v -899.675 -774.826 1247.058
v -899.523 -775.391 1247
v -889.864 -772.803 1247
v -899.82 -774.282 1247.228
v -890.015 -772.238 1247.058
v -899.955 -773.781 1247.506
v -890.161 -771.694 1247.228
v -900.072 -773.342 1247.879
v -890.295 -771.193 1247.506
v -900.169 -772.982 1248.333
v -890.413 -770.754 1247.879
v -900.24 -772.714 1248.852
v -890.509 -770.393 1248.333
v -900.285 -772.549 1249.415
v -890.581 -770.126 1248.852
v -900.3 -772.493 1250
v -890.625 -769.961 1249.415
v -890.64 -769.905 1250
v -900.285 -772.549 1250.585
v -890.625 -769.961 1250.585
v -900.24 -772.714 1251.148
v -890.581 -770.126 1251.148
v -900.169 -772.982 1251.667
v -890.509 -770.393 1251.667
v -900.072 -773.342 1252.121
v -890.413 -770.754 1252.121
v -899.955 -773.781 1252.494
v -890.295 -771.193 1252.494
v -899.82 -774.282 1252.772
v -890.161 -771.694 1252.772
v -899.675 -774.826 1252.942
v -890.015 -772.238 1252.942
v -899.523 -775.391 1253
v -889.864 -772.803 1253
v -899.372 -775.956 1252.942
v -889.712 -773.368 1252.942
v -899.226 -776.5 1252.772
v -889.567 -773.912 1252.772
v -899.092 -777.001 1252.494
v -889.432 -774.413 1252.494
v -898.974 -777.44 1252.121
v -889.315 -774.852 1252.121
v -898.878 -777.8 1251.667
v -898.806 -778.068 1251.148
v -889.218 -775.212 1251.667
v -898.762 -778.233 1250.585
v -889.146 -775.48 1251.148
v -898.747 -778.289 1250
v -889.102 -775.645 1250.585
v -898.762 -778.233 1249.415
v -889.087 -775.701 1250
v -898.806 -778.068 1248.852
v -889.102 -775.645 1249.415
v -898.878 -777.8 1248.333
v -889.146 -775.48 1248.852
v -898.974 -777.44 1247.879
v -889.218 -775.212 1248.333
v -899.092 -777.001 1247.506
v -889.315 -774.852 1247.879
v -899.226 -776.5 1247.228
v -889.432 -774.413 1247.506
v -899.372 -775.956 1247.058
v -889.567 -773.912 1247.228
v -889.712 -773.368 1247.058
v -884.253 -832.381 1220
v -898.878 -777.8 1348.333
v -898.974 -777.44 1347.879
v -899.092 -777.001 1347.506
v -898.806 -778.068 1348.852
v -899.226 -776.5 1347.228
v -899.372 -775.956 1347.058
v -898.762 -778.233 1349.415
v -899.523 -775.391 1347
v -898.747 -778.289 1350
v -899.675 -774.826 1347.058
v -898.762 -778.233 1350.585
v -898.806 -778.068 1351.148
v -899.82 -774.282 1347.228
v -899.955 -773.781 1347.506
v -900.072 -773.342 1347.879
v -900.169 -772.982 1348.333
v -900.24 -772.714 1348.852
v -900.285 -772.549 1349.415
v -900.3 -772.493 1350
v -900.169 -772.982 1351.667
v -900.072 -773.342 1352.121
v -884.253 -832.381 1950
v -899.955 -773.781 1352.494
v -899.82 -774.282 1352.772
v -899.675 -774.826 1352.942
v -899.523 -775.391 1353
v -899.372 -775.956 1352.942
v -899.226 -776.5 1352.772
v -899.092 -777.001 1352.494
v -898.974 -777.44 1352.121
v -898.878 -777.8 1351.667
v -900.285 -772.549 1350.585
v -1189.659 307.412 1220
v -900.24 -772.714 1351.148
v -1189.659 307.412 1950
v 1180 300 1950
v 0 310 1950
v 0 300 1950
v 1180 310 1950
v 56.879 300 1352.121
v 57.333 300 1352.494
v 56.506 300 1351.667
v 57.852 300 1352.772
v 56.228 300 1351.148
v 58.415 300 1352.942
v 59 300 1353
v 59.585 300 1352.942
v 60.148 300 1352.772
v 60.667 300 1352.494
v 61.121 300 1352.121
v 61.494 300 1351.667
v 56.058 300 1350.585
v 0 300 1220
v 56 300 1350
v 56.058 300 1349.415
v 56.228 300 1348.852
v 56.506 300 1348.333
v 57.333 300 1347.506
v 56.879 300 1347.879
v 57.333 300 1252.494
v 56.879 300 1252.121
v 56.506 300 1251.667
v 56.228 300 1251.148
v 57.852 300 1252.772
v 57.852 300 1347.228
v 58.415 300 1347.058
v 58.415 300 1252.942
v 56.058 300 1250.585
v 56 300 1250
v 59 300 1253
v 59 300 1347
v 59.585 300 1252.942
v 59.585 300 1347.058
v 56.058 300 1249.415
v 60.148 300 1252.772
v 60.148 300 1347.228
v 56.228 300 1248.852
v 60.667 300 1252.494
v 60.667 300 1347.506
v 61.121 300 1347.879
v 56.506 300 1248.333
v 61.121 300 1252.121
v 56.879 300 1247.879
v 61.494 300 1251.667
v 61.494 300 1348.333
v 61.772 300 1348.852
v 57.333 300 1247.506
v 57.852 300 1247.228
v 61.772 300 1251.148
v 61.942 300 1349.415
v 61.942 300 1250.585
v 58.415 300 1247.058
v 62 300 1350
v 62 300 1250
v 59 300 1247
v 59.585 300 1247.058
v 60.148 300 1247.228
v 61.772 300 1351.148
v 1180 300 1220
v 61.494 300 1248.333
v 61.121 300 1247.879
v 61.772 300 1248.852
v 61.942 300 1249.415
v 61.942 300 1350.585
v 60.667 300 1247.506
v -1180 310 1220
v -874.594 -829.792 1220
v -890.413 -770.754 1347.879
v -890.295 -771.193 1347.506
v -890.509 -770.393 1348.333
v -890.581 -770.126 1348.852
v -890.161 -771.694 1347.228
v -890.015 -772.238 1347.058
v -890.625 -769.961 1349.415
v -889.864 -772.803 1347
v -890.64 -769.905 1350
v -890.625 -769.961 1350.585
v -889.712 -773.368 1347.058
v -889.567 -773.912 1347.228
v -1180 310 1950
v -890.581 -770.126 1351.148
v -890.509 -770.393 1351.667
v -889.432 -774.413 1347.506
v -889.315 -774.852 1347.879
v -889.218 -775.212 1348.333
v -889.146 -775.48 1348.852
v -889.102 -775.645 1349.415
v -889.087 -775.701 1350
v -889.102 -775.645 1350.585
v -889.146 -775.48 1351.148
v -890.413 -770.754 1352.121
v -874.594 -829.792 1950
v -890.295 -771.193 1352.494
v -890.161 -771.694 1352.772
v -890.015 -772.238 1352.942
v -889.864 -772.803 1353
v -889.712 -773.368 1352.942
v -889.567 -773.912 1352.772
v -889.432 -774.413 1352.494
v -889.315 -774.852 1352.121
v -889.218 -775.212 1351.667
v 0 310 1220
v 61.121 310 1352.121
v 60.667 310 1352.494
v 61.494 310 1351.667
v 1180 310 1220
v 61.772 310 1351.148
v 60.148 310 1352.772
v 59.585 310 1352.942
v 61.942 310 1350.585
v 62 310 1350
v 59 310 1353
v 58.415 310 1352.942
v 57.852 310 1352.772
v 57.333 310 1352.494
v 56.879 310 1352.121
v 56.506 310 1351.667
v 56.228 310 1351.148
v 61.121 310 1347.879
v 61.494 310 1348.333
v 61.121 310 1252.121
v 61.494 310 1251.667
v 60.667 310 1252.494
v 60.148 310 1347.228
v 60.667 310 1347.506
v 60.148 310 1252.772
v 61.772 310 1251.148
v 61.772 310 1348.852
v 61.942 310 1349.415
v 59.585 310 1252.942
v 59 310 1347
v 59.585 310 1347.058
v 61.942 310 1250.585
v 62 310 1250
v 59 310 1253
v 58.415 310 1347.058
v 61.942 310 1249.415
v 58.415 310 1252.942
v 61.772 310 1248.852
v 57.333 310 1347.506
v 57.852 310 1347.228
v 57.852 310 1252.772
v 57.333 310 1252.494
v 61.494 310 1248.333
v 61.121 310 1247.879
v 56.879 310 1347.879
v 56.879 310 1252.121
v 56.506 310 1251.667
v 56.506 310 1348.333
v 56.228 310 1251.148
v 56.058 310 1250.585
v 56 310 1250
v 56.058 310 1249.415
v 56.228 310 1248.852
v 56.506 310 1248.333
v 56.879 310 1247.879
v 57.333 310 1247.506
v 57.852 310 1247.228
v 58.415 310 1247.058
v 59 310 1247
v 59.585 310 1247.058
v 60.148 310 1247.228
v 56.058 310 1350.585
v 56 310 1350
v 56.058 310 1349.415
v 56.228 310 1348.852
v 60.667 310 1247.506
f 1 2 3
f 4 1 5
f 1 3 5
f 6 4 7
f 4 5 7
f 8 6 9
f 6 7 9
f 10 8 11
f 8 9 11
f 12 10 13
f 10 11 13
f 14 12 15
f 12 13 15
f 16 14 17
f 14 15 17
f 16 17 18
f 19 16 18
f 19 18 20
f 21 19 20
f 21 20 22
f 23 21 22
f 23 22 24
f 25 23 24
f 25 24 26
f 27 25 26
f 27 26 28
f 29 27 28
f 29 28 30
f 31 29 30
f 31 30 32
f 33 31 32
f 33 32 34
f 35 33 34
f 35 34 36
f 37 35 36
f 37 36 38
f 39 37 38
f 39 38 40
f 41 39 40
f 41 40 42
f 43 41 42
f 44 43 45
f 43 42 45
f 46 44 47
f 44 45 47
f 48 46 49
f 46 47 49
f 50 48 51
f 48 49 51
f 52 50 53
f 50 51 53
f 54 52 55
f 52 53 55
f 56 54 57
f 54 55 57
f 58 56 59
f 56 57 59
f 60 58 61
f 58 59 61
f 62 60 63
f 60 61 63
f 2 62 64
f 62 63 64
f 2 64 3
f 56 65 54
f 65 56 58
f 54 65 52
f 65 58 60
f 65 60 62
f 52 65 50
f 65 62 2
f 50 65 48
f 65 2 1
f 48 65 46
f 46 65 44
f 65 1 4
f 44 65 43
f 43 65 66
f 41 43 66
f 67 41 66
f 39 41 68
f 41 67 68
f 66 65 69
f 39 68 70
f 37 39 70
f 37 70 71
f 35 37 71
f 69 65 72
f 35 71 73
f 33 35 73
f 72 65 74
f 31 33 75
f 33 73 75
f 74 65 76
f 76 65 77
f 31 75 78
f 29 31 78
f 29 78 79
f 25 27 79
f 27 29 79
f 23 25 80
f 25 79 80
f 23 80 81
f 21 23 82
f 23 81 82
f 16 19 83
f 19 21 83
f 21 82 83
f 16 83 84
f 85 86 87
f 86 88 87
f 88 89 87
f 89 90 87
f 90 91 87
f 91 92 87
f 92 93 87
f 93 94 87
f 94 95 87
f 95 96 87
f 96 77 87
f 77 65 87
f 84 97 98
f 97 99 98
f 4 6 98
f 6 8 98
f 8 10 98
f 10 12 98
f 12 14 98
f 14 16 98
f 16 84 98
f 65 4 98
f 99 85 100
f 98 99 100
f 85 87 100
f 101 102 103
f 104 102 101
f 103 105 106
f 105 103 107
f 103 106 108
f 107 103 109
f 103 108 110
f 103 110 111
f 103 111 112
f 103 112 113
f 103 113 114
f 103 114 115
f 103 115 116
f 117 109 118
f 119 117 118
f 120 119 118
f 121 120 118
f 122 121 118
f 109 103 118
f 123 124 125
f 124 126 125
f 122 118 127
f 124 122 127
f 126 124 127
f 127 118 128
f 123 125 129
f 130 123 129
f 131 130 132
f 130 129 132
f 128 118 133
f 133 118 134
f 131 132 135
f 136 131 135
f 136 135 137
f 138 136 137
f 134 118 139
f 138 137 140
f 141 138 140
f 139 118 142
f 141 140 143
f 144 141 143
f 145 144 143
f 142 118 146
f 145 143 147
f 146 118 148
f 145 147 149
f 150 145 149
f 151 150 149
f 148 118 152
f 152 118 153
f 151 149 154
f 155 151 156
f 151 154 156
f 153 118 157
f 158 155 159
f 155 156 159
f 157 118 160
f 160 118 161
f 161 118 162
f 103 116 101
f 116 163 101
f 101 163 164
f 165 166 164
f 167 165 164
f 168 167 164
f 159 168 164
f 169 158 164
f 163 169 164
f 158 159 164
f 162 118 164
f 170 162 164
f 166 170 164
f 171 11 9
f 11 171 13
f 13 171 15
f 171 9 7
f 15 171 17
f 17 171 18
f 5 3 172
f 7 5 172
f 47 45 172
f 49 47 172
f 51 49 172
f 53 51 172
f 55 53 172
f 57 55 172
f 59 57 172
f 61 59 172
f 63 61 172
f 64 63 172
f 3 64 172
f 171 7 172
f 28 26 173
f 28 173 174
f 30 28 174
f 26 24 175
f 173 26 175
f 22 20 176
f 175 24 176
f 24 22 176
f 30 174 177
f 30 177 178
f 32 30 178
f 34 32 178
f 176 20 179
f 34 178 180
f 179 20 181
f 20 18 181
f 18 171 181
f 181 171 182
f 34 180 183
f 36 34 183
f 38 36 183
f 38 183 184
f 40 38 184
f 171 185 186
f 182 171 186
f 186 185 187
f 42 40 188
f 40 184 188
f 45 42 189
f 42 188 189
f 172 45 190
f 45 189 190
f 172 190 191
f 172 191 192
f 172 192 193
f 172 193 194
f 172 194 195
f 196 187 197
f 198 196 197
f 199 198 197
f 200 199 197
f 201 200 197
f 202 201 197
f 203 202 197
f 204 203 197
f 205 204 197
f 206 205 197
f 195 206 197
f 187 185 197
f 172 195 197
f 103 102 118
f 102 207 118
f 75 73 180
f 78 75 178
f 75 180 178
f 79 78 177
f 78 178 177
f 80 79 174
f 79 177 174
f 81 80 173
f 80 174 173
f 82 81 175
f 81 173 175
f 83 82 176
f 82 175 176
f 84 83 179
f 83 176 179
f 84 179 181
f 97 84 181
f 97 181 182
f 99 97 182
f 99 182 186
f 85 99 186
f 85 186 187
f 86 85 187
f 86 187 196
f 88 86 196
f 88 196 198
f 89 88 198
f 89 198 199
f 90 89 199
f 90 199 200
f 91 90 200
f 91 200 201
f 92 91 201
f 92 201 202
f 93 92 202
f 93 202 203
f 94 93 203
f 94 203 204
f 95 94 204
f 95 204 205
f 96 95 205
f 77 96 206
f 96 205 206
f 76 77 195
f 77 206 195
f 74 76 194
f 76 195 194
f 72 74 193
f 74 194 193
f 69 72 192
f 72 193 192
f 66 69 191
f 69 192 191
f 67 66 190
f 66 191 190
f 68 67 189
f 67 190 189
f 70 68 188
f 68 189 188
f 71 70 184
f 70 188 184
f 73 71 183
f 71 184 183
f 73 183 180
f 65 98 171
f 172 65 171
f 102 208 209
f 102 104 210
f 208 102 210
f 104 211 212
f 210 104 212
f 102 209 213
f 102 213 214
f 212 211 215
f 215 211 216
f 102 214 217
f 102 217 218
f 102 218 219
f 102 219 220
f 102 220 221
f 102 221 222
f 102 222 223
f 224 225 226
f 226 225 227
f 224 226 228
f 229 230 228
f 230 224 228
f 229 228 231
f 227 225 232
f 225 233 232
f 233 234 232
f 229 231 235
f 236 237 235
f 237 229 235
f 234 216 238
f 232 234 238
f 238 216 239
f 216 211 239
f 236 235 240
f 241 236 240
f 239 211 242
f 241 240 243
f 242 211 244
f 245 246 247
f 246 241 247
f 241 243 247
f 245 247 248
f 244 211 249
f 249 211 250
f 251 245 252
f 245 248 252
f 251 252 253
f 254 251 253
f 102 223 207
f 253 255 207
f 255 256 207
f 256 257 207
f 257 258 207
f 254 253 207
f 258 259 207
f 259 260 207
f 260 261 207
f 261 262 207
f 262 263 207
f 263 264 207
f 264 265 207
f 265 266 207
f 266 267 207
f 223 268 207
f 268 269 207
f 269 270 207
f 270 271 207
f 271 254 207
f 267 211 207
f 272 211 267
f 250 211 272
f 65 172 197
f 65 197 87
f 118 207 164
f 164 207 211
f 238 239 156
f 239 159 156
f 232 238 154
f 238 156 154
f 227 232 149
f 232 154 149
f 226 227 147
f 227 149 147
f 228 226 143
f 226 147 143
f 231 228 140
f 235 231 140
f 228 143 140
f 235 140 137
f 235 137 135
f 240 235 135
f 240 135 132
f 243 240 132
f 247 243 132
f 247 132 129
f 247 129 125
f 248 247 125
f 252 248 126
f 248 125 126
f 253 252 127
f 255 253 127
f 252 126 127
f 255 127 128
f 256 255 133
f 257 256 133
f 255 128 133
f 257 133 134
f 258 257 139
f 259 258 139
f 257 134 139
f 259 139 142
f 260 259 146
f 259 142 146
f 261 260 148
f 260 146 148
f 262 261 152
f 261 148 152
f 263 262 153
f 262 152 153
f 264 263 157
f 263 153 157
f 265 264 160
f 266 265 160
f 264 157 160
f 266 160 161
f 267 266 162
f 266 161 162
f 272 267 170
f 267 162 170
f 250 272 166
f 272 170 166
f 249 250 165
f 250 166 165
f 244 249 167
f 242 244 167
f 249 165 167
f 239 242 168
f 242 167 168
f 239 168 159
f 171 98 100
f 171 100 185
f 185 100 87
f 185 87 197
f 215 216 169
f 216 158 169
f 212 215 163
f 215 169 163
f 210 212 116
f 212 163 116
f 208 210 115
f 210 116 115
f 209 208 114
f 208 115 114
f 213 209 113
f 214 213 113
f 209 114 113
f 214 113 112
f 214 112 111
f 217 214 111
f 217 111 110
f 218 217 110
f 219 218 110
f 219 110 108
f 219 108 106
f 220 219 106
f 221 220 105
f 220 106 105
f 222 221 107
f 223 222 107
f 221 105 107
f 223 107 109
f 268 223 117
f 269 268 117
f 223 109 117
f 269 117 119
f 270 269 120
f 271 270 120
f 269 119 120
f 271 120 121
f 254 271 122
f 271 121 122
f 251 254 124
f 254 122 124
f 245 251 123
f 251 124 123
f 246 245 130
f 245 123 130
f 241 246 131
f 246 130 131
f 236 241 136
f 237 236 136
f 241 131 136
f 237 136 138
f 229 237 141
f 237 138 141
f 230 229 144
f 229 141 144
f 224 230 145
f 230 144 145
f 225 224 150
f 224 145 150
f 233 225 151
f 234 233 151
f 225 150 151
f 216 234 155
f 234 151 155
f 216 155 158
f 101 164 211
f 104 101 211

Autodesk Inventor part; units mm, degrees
ref_plane "YZ Plane" through (0, 0, 0) normal (1, 0, 0) x (0, 1, 0)
ref_plane "XZ Plane" through (0, 0, 0) normal (0, 1, 0) x (-1, 0, 0)
ref_plane "Plano de trabajo4" through (0, 0, 1220) normal (0, 0, 1) x (1, 0, 0)
sketch "Boceto8" plane through (0, 0, 1220) normal (0, 0, 1) x (1, 0, 0)
  line L0 (480, 0) -> (0, 0) projected
  line L1 (480, 0) -> (480, 10) projected
  line L2 (0, 10) -> (480, 10) projected
  line L3 (0, 0) -> (0, 10) projected
  line L4 (480, 10) -> (0, 10) projected
  line L5 (0, 10) -> (0, 300)
  line L6 (0, 300) -> (1180, 300)
  line L7 (1180, 300) -> (1180, 310)
  line L8 (1180, 310) -> (0, 310)
  line L9 (0, 310) -> (0, 300)
  point P0 (0, 0)
  dimension "d38" = 290
  dimension "d39" = 1180
  dimension "d40" = 10
extrude "Extrusión8" add sketch "Boceto8" along normal blind 730 contours L9 L8 L7 L6
sketch "Boceto9" plane through (0, 300, 1220) normal (0, -1, 0) x (1, 0, 0)
  line L0 (0, 0) -> (1180, 0) construction
  line L1 (1180, 0) -> (1180, 730) construction
  line L2 (0, 730) -> (1180, 730) construction
  line L3 (0, 0) -> (0, 730) construction
  line L4 (0, 80) -> (1180, 80) construction
  line L5 (0, 0) -> (1180, 0) construction
  line L6 (59, 0) -> (59, 730) construction
  line L7 (0, 730) -> (1180, 730) construction
  circle A0 centre (59, 30) radius 3
  circle A1 centre (59, 130) radius 3
  point P0 (0, -1220)
  dimension "d43" = 59
  dimension "d44" = 80
  dimension "d45" = 6
  dimension "d46" = 50
extrude "Extrusión9" cut sketch "Boceto9" against normal up to next
sketch "Boceto10" plane through (0, 0, 1950) normal (0, 0, 1) x (1, 0, 0)
  line L0 (1180, 310) -> (0, 310) projected
  line L1 (0, 310) -> (-1180, 310)
  line L2 (-1180, 310) -> (-874.5935, -829.7925)
  line L3 (-874.5935, -829.7925) -> (-884.2528, -832.3807)
  line L4 (-884.2528, -832.3807) -> (-1189.6593, 307.4118)
  line L5 (-1189.6593, 307.4118) -> (-1180, 310)
  point P0 (0, 0)
  dimension "d49" = 1180
  dimension "d50" = 1180
  dimension "angulo" = 75
  dimension "d52" = 10
  dimension "d53" = 1180
extrude "Extrusión10" add sketch "Boceto10" against normal blind 730
sketch "Boceto11" plane through (-874.5935, -829.7925, 1950) normal (0.9659, 0.2588, 0) x (0, 0, -1)
  line L0 (0, 1180) -> (0, 0) construction
  line L1 (0, 0) -> (730, 0) construction
  line L2 (730, 1180) -> (730, 0) construction
  line L3 (0, 1180) -> (730, 1180) construction
  line L4 (0, 1180) -> (0, 0) construction
  line L5 (0, 59) -> (730, 59) construction
  line L6 (0, 0) -> (730, 0) construction
  line L7 (650, 0) -> (650, 1180) construction
  line L8 (0, 1180) -> (730, 1180) construction
  circle A0 centre (700, 59) radius 3
  circle A1 centre (600, 59) radius 3
  point P0 (1950, 575.1565)
  dimension "d56" = 59
  dimension "d57" = 80
  dimension "d58" = 6
  dimension "d59" = 50
extrude "Extrusión11" cut sketch "Boceto11" against normal up to next
equation "\"d39\" = ancho_m"
equation "\"d40\" = espesor"
equation "\"d43\" = 0.05 * ancho_m"
equation "\"d49\" = ancho_m"
equation "\"d50\" = ancho_m"
equation "\"d52\" = espesor"
equation "\"d53\" = ancho_m"
equation "\"d54\" = h_sup"
equation "\"d56\" = 0.05 * ancho_m"
equation "\"d60\" = h_sup"
equation "\"ancho_m\" = 1180"
equation "\"espesor\" = 10"
equation "\"h_sup\" = 730"
properties part number "puerta"
